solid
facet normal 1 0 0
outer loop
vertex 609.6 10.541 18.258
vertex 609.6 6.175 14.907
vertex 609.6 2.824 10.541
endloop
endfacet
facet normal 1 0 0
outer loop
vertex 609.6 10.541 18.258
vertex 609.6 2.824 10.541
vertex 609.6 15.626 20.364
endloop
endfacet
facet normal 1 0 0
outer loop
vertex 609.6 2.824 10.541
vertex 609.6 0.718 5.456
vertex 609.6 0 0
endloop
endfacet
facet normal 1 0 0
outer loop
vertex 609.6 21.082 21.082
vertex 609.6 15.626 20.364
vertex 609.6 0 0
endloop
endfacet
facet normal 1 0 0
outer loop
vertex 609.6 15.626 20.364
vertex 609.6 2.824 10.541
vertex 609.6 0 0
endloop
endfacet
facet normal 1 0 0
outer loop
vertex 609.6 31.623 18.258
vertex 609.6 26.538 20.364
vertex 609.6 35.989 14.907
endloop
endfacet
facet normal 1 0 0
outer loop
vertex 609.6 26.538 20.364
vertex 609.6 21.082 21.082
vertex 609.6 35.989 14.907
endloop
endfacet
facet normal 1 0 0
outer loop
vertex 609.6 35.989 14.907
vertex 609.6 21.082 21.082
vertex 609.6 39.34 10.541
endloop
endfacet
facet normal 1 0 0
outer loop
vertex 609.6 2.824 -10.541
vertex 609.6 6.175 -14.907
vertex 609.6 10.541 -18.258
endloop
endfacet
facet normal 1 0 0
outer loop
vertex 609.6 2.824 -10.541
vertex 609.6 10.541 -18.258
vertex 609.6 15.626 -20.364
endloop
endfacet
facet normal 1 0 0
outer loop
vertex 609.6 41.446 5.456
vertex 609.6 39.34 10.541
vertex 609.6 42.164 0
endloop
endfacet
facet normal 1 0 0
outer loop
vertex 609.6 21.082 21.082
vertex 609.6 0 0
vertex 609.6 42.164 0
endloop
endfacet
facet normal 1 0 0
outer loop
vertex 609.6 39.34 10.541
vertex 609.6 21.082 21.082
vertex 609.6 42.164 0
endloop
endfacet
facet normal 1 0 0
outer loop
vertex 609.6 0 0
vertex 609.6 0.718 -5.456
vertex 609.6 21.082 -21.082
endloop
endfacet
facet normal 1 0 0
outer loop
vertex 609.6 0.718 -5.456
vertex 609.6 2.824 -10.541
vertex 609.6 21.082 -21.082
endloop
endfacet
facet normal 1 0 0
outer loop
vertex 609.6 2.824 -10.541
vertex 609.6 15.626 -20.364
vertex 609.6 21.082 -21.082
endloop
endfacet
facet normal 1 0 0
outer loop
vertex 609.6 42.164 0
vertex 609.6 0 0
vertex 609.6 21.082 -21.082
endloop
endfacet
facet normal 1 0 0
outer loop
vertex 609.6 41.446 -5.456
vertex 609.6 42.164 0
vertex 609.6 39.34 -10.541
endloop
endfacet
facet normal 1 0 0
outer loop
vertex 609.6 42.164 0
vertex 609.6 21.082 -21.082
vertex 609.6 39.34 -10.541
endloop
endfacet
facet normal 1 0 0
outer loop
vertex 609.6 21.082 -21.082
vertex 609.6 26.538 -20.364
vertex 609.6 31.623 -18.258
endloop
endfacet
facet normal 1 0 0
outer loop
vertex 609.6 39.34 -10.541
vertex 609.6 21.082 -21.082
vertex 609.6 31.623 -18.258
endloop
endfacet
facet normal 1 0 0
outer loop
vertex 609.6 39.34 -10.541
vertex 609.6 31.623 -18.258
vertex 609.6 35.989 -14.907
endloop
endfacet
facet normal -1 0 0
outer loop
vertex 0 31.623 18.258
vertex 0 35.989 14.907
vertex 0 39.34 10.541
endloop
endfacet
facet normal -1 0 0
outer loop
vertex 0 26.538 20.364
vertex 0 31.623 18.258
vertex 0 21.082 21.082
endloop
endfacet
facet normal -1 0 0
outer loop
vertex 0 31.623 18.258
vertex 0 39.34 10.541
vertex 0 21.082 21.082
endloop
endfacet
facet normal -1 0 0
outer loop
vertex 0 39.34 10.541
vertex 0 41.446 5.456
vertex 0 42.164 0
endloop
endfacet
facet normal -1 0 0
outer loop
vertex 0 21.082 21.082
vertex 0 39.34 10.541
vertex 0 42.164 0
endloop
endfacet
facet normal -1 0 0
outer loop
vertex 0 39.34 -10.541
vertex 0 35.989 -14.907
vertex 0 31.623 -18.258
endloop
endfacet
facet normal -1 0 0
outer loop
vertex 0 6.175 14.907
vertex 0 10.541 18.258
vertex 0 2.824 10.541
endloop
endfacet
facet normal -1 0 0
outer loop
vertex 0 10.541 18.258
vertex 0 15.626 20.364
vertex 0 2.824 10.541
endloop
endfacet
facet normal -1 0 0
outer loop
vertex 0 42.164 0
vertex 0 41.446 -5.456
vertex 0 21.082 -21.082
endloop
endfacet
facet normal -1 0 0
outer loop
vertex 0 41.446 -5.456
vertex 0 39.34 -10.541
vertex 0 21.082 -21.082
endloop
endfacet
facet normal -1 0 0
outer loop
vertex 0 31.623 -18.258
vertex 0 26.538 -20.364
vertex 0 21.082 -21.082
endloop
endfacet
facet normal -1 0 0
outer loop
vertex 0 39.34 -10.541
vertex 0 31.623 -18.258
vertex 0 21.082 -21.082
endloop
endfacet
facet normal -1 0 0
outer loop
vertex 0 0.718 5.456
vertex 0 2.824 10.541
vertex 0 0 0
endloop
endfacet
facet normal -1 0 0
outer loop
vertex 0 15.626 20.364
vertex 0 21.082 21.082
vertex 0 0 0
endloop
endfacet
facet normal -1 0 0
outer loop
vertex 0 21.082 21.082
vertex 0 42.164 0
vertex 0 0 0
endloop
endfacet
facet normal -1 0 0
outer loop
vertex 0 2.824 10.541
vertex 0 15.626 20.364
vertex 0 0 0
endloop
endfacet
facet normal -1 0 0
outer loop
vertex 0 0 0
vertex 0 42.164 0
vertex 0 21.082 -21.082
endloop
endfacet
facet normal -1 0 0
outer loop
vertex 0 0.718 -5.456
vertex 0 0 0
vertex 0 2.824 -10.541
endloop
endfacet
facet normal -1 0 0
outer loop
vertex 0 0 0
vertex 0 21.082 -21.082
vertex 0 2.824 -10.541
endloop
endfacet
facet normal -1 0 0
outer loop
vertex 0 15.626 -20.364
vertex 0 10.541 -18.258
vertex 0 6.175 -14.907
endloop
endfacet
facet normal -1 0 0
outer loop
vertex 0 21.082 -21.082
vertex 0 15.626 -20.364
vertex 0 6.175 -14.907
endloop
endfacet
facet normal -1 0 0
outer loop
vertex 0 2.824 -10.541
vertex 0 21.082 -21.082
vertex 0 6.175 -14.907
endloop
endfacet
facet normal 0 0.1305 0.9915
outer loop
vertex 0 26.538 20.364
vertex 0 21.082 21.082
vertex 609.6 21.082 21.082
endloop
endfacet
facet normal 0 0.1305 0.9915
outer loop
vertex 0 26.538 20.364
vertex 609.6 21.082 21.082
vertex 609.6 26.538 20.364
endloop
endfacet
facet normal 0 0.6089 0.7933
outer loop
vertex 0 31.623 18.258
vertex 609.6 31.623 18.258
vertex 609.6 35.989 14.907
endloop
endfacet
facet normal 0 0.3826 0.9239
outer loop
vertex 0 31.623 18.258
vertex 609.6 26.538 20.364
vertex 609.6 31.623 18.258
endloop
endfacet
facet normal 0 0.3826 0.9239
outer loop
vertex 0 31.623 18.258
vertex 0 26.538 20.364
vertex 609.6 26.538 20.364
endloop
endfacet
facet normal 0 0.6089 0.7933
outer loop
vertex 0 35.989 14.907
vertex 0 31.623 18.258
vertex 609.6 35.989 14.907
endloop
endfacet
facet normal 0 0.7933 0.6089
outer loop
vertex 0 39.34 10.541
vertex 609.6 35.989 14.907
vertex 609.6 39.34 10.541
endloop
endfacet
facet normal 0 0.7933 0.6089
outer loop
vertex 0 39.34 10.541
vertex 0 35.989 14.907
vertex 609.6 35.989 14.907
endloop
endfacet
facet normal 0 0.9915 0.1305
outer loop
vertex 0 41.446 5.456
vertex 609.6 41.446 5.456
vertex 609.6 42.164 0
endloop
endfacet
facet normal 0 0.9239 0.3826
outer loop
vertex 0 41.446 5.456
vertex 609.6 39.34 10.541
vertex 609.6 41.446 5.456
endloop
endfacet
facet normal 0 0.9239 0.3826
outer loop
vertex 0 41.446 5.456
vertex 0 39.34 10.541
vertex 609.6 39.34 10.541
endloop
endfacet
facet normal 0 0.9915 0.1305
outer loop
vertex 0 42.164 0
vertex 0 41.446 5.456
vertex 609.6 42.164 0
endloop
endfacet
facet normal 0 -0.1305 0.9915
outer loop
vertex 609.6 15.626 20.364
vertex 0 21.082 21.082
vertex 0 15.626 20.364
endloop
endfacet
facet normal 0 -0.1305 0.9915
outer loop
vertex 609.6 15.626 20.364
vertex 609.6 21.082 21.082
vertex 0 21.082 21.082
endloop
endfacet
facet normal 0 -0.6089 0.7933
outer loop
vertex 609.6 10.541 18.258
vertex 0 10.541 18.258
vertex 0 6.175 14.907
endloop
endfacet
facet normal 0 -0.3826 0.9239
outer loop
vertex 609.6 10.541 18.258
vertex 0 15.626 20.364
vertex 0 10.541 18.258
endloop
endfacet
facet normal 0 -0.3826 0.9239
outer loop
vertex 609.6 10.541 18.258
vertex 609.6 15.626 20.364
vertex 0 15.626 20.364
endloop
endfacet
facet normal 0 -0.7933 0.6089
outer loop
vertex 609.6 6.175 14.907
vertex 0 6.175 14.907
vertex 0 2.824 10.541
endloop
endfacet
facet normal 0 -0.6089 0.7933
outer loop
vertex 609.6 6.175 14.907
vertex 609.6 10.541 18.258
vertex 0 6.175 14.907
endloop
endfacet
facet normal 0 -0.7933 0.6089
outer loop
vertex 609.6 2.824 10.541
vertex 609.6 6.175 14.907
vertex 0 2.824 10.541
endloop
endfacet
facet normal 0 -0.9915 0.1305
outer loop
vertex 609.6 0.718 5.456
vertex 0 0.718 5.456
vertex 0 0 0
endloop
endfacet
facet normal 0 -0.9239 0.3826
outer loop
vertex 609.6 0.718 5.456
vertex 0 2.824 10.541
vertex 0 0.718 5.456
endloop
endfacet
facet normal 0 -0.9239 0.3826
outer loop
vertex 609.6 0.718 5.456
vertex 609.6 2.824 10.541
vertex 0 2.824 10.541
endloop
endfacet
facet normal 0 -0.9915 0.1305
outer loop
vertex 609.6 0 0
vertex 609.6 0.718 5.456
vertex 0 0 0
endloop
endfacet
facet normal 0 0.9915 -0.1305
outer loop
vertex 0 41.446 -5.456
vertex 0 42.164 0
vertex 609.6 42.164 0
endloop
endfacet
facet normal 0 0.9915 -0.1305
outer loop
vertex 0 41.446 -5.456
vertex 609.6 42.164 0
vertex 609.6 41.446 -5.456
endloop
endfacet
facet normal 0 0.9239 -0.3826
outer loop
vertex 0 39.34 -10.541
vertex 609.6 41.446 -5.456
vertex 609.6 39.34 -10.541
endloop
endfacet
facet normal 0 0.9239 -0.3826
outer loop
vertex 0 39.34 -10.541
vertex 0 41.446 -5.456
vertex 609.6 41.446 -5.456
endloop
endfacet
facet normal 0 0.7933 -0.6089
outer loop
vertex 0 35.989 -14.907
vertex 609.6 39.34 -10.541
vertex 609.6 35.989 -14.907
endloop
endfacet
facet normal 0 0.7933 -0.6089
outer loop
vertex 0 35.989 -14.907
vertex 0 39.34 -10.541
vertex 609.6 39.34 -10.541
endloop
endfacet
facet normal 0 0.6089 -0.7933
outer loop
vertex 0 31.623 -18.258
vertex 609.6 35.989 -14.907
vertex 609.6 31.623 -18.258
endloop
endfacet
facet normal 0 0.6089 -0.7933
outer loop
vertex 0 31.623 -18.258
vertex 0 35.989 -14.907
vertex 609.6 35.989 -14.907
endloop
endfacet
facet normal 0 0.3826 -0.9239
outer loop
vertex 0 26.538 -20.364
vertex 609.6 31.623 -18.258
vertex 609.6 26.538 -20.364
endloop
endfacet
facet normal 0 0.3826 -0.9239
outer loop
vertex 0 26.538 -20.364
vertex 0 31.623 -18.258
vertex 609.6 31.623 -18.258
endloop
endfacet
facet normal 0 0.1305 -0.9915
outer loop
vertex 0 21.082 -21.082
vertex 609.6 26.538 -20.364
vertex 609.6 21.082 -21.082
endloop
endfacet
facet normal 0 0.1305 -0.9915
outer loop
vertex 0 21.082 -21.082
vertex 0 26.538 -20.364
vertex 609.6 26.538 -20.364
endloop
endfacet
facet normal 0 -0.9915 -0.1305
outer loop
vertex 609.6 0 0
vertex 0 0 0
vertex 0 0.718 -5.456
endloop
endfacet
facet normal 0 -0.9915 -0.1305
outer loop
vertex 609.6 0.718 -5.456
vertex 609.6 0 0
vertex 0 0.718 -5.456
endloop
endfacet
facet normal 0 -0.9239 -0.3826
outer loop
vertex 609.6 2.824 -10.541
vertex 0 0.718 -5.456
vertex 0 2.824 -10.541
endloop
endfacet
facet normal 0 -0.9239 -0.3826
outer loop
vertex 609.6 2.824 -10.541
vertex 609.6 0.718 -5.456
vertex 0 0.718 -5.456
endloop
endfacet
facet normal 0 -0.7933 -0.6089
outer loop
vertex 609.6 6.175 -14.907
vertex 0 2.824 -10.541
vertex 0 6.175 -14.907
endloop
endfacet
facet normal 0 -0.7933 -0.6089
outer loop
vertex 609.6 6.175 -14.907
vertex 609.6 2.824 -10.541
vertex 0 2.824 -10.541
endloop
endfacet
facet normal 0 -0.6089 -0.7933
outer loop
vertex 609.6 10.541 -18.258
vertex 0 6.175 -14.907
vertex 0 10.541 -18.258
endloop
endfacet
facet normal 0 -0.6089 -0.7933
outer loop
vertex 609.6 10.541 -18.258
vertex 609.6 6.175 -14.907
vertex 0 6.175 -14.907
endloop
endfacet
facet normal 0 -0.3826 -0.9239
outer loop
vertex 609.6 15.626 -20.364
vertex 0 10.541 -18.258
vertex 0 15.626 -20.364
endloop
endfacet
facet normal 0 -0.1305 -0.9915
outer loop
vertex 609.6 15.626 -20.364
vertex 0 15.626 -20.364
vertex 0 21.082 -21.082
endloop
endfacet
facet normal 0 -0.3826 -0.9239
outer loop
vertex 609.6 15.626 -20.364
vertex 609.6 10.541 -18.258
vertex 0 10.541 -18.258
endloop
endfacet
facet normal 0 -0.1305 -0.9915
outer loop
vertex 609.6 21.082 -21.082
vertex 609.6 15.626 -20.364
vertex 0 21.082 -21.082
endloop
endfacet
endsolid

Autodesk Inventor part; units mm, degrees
ref_plane "YZ Plane" through (0, 0, 0) normal (1, 0, 0) x (0, 1, 0)
sketch "1.90 Caprail" plane through (0, 0, 0) normal (0, 0, 1) x (1, 0, 0)
  line L0 (-57.7384, 25.6152) -> (-57.7384, 36.7912) construction
  arc A0 (-65.9934, 36.7912) -> (-67.5174, 35.2672) centre (-65.9934, 35.2672) ccw
  arc A1 (-47.9594, 35.2672) -> (-49.4834, 36.7912) centre (-49.4834, 35.2672) ccw
  arc A2 (-69.8345, 6.4876) -> (-69.016, 6.9384) centre (-69.5494, 6.9384) ccw
  line L1 (-69.016, 6.9384) -> (-69.016, 35.2672)
  arc A3 (-65.9934, 38.2898) -> (-69.016, 35.2672) centre (-65.9934, 35.2672) ccw
  line L2 (-65.9934, 38.2898) -> (-49.4834, 38.2898)
  arc A4 (-46.4608, 35.2672) -> (-49.4834, 38.2898) centre (-49.4834, 35.2672) ccw
  line L3 (-46.4608, 35.2672) -> (-46.4608, 6.9384)
  arc A5 (-46.4608, 6.9384) -> (-45.6423, 6.4876) centre (-45.9274, 6.9384) ccw
  arc A6 (-45.6423, 6.4876) -> (-69.8345, 6.4876) centre (-57.7384, 25.6152) ccw
  line L4 (-47.9594, 6.9384) -> (-47.9594, 35.2672)
  line L5 (-49.4834, 36.7912) -> (-65.9934, 36.7912)
  line L6 (-67.5174, 35.2672) -> (-67.5174, 6.9384)
  arc A7 (-70.5058, 5.1455) -> (-67.5174, 6.9384) centre (-69.5494, 6.9384) ccw
  arc A8 (-47.9594, 6.9384) -> (-44.9711, 5.1455) centre (-45.9274, 6.9384) ccw
  arc A9 (-70.5083, 5.1411) -> (-44.9685, 5.1411) centre (-57.7384, 25.6152) ccw
  circle A10 centre (-57.7384, 25.6152) radius 24.13 construction
  arc A11 (-70.5058, 5.1455) -> (-70.5083, 5.1411) centre (-70.507, 5.1433) ccw
  arc A12 (-44.9685, 5.1411) -> (-44.9711, 5.1455) centre (-44.9699, 5.1433) ccw
  point P0 (-47.9594, 36.7912)
  point P1 (-67.5174, 36.7912)
  dimension "d0" = 48.26
  dimension "d1" = 19.558
  dimension "d2" = 2.032
  dimension "d3" = 11.176
  dimension "d4" = 1.524
  dimension "d5" = 1.4986
  dimension "d6" = 0.0025
sketch "1.66 Caprail" plane through (0, 0, 0) normal (0, 0, 1) x (1, 0, 0)
  arc A0 (55.7245, -3.4499) -> (81.6283, -3.4499) centre (68.6764, 13.1843) ccw
  arc A1 (55.7275, -3.4458) -> (58.8974, -1.7623) centre (56.8654, -1.7623) ccw
  arc A2 (78.4554, -1.7623) -> (81.6253, -3.4458) centre (80.4874, -1.7623) ccw
  line L0 (58.8974, -1.7623) -> (58.8974, 20.8043)
  line L1 (60.4214, 22.3283) -> (76.9314, 22.3283)
  line L2 (78.4554, 20.8043) -> (78.4554, -1.7623)
  line L3 (68.6764, 22.3283) -> (68.6764, 13.1843) construction
  arc A3 (60.4214, 22.3283) -> (58.8974, 20.8043) centre (60.4214, 20.8043) ccw
  arc A4 (78.4554, 20.8043) -> (76.9314, 22.3283) centre (76.9314, 20.8043) ccw
  arc A5 (79.954, -1.7623) -> (80.8181, -2.1808) centre (80.4874, -1.7623) ccw
  line L4 (79.954, -1.7623) -> (79.954, 20.8043)
  arc A6 (79.954, 20.8043) -> (76.9314, 23.8269) centre (76.9314, 20.8043) ccw
  line L5 (76.9314, 23.8269) -> (60.4214, 23.8269)
  arc A7 (60.4214, 23.8269) -> (57.3988, 20.8043) centre (60.4214, 20.8043) ccw
  line L6 (57.3988, 20.8043) -> (57.3988, -1.7623)
  arc A8 (56.5347, -2.1808) -> (57.3988, -1.7623) centre (56.8654, -1.7623) ccw
  arc A9 (80.8181, -2.1808) -> (56.5347, -2.1808) centre (68.6764, 13.1843) ccw
  circle A10 centre (68.6764, 13.1843) radius 21.082 construction
  arc A11 (55.7275, -3.4458) -> (55.7245, -3.4499) centre (55.7261, -3.4479) ccw
  arc A12 (81.6283, -3.4499) -> (81.6253, -3.4458) centre (81.6268, -3.4479) ccw
  point P0 (58.8974, 22.3283)
  point P1 (78.4554, 22.3283)
  dimension "d7" = 42.164
  dimension "d8" = 19.558
  dimension "d9" = 9.144
  dimension "d10" = 2.032
  dimension "d11" = 1.524
  dimension "d12" = 1.4986
  dimension "d13" = 0.0025
sketch "1.50 Caprail" plane through (0, 0, 0) normal (0, 0, 1) x (1, 0, 0)
  arc A0 (154.6368, -0.6357) -> (180.8596, -0.6357) centre (167.7482, 13.1843) ccw
  arc A1 (154.6402, -0.6319) -> (157.9692, 0.9323) centre (155.9372, 0.9323) ccw
  arc A2 (177.5272, 0.9323) -> (180.8562, -0.6319) centre (179.5592, 0.9323) ccw
  circle A3 centre (167.7482, 13.1843) radius 19.05 construction
  arc A4 (179.0258, 0.9323) -> (179.9294, 0.5483) centre (179.5592, 0.9323) ccw
  line L0 (179.0258, 0.9323) -> (179.0258, 23.0903)
  arc A5 (179.0258, 23.0903) -> (176.0032, 26.1129) centre (176.0032, 23.0903) ccw
  line L1 (176.0032, 26.1129) -> (159.4932, 26.1129)
  arc A6 (159.4932, 26.1129) -> (156.4706, 23.0903) centre (159.4932, 23.0903) ccw
  line L2 (156.4706, 23.0903) -> (156.4706, 0.9323)
  arc A7 (155.567, 0.5483) -> (156.4706, 0.9323) centre (155.9372, 0.9323) ccw
  arc A8 (179.9294, 0.5483) -> (155.567, 0.5483) centre (167.7482, 13.1843) ccw
  line L3 (157.9692, 0.9323) -> (157.9692, 23.0903)
  line L4 (159.4932, 24.6143) -> (176.0032, 24.6143)
  line L5 (177.5272, 23.0903) -> (177.5272, 0.9323)
  arc A9 (159.4932, 24.6143) -> (157.9692, 23.0903) centre (159.4932, 23.0903) ccw
  arc A10 (177.5272, 23.0903) -> (176.0032, 24.6143) centre (176.0032, 23.0903) ccw
  line L6 (167.7482, 24.6143) -> (167.7482, 13.1843) construction
  arc A11 (154.6402, -0.6319) -> (154.6368, -0.6357) centre (154.6385, -0.6339) ccw
  arc A12 (180.8596, -0.6357) -> (180.8562, -0.6319) centre (180.8578, -0.6339) ccw
  point P0 (157.9692, 24.6143)
  point P1 (177.5272, 24.6143)
  dimension "d14" = 38.1
  dimension "d15" = 19.558
  dimension "d16" = 2.032
  dimension "d17" = 1.524
  dimension "d18" = 11.43
  dimension "d19" = 1.4986
  dimension "d20" = 0.0025
sketch "1.90 Caprail Outside Edge" plane through (0, 0, 0) normal (0, 0, 1) x (1, 0, 0)
  arc A0 (8.6191, 38.6174) -> (-17.175, 38.6174) centre (-4.278, 59.0116) ccw
  line L0 (5.501, 40.3348) -> (5.501, 68.5975)
  line L1 (3.977, 70.1215) -> (-12.533, 70.1215)
  line L2 (-14.057, 68.5975) -> (-14.057, 40.3348)
  line L3 (-4.278, 59.0116) -> (-4.278, 70.1215) construction
  arc A1 (-17.175, 38.6174) -> (-14.057, 40.3348) centre (-16.089, 40.3348) ccw
  arc A2 (5.501, 40.3348) -> (8.6191, 38.6174) centre (7.533, 40.3348) ccw
  arc A3 (-12.533, 70.1215) -> (-14.057, 68.5975) centre (-12.533, 68.5975) ccw
  arc A4 (5.501, 68.5975) -> (3.977, 70.1215) centre (3.977, 68.5975) ccw
  point P0 (5.501, 70.1215)
  point P1 (-14.057, 70.1215)
  point P2 (-14.057, 36.9519)
  point P3 (5.501, 36.9519)
  dimension "d21" = 13.02
  dimension "d22" = 19.558
  dimension "d23" = 24.13
  dimension "d24" = 2.032
  dimension "d25" = 1.524
sketch "1.66 Caprail Outside Edge" plane through (0, 0, 0) normal (0, 0, 1) x (1, 0, 0)
  arc A0 (-64.2087, 6.8983) -> (-90.3503, 6.8983) centre (-77.2795, 23.4393) ccw
  line L0 (-67.5005, 8.4926) -> (-67.5005, 30.9932)
  line L1 (-69.0245, 32.5172) -> (-85.5345, 32.5172)
  line L2 (-87.0585, 30.9932) -> (-87.0585, 8.4926)
  line L3 (-77.2795, 23.4393) -> (-77.2795, 32.5172) construction
  arc A1 (-90.3503, 6.8983) -> (-87.0585, 8.4926) centre (-89.0905, 8.4926) ccw
  arc A2 (-67.5005, 8.4926) -> (-64.2087, 6.8983) centre (-65.4685, 8.4926) ccw
  arc A3 (-85.5345, 32.5172) -> (-87.0585, 30.9932) centre (-85.5345, 30.9932) ccw
  arc A4 (-67.5005, 30.9932) -> (-69.0245, 32.5172) centre (-69.0245, 30.9932) ccw
  point P0 (-67.5005, 32.5172)
  point P1 (-87.0585, 32.5172)
  point P2 (-87.0585, 4.7625)
  point P3 (-67.5005, 4.7625)
  dimension "d26" = 12.004
  dimension "d27" = 19.558
  dimension "d28" = 21.082
  dimension "d29" = 2.032
  dimension "d30" = 1.524
sketch "1.50 Caprail Outside Edge" plane through (0, 0, 0) normal (0, 0, 1) x (1, 0, 0)
  arc A0 (-129.2922, 11.7711) -> (-155.7348, 11.7711) centre (-142.5135, 25.486) ccw
  line L0 (-132.7345, 13.234) -> (-132.7345, 35.4784)
  line L1 (-134.2585, 37.0024) -> (-150.7685, 37.0024)
  line L2 (-152.2925, 35.4784) -> (-152.2925, 13.234)
  line L3 (-142.5135, 25.486) -> (-142.5135, 37.0024) construction
  arc A1 (-155.7348, 11.7711) -> (-152.2925, 13.234) centre (-154.3245, 13.234) ccw
  arc A2 (-132.7345, 13.234) -> (-129.2922, 11.7711) centre (-130.7025, 13.234) ccw
  arc A3 (-150.7685, 37.0024) -> (-152.2925, 35.4784) centre (-150.7685, 35.4784) ccw
  arc A4 (-132.7345, 35.4784) -> (-134.2585, 37.0024) centre (-134.2585, 35.4784) ccw
  point P0 (-132.7345, 37.0024)
  point P1 (-152.2925, 37.0024)
  point P2 (-152.2925, 9.1375)
  point P3 (-132.7345, 9.1375)
  dimension "d31" = 7.5336
  dimension "d32" = 19.558
  dimension "d33" = 19.05
  dimension "d34" = 2.032
  dimension "d35" = 1.524
sketch "Sketch1" plane through (0, 0, 0) normal (0, 0, 1) x (1, 0, 0)
  line L0 (0, 0) -> (609.6, 0)
  line L1 (609.6, 0) -> (609.6, 42.164)
  line L2 (609.6, 42.164) -> (0, 42.164)
  line L3 (0, 42.164) -> (0, 0)
  dimension "d37" = 42.164
  dimension "d38" = 609.6
extrude "Extrusion1" add sketch "Sketch1" along normal mid plane 42.164
fillet "Fillet1" radius 21.082 4 edges at (304.8, 42.164, -21.082) (304.8, 42.164, 21.082) (304.8, 0, -21.082) (304.8, 0, 21.082)
equation "\"d37\" = PipeOD"
equation "\"d39\" = PipeOD"
equation "\"d41\" = 0.5 * PipeOD"
equation "\"PipeOD\" = 42.164"
equation "\"PipeWallThickness\" = 3.556"
equation "\"Length\" = 609.6"
properties part number "Update_SetBaseQuantity" material "P792.4"
